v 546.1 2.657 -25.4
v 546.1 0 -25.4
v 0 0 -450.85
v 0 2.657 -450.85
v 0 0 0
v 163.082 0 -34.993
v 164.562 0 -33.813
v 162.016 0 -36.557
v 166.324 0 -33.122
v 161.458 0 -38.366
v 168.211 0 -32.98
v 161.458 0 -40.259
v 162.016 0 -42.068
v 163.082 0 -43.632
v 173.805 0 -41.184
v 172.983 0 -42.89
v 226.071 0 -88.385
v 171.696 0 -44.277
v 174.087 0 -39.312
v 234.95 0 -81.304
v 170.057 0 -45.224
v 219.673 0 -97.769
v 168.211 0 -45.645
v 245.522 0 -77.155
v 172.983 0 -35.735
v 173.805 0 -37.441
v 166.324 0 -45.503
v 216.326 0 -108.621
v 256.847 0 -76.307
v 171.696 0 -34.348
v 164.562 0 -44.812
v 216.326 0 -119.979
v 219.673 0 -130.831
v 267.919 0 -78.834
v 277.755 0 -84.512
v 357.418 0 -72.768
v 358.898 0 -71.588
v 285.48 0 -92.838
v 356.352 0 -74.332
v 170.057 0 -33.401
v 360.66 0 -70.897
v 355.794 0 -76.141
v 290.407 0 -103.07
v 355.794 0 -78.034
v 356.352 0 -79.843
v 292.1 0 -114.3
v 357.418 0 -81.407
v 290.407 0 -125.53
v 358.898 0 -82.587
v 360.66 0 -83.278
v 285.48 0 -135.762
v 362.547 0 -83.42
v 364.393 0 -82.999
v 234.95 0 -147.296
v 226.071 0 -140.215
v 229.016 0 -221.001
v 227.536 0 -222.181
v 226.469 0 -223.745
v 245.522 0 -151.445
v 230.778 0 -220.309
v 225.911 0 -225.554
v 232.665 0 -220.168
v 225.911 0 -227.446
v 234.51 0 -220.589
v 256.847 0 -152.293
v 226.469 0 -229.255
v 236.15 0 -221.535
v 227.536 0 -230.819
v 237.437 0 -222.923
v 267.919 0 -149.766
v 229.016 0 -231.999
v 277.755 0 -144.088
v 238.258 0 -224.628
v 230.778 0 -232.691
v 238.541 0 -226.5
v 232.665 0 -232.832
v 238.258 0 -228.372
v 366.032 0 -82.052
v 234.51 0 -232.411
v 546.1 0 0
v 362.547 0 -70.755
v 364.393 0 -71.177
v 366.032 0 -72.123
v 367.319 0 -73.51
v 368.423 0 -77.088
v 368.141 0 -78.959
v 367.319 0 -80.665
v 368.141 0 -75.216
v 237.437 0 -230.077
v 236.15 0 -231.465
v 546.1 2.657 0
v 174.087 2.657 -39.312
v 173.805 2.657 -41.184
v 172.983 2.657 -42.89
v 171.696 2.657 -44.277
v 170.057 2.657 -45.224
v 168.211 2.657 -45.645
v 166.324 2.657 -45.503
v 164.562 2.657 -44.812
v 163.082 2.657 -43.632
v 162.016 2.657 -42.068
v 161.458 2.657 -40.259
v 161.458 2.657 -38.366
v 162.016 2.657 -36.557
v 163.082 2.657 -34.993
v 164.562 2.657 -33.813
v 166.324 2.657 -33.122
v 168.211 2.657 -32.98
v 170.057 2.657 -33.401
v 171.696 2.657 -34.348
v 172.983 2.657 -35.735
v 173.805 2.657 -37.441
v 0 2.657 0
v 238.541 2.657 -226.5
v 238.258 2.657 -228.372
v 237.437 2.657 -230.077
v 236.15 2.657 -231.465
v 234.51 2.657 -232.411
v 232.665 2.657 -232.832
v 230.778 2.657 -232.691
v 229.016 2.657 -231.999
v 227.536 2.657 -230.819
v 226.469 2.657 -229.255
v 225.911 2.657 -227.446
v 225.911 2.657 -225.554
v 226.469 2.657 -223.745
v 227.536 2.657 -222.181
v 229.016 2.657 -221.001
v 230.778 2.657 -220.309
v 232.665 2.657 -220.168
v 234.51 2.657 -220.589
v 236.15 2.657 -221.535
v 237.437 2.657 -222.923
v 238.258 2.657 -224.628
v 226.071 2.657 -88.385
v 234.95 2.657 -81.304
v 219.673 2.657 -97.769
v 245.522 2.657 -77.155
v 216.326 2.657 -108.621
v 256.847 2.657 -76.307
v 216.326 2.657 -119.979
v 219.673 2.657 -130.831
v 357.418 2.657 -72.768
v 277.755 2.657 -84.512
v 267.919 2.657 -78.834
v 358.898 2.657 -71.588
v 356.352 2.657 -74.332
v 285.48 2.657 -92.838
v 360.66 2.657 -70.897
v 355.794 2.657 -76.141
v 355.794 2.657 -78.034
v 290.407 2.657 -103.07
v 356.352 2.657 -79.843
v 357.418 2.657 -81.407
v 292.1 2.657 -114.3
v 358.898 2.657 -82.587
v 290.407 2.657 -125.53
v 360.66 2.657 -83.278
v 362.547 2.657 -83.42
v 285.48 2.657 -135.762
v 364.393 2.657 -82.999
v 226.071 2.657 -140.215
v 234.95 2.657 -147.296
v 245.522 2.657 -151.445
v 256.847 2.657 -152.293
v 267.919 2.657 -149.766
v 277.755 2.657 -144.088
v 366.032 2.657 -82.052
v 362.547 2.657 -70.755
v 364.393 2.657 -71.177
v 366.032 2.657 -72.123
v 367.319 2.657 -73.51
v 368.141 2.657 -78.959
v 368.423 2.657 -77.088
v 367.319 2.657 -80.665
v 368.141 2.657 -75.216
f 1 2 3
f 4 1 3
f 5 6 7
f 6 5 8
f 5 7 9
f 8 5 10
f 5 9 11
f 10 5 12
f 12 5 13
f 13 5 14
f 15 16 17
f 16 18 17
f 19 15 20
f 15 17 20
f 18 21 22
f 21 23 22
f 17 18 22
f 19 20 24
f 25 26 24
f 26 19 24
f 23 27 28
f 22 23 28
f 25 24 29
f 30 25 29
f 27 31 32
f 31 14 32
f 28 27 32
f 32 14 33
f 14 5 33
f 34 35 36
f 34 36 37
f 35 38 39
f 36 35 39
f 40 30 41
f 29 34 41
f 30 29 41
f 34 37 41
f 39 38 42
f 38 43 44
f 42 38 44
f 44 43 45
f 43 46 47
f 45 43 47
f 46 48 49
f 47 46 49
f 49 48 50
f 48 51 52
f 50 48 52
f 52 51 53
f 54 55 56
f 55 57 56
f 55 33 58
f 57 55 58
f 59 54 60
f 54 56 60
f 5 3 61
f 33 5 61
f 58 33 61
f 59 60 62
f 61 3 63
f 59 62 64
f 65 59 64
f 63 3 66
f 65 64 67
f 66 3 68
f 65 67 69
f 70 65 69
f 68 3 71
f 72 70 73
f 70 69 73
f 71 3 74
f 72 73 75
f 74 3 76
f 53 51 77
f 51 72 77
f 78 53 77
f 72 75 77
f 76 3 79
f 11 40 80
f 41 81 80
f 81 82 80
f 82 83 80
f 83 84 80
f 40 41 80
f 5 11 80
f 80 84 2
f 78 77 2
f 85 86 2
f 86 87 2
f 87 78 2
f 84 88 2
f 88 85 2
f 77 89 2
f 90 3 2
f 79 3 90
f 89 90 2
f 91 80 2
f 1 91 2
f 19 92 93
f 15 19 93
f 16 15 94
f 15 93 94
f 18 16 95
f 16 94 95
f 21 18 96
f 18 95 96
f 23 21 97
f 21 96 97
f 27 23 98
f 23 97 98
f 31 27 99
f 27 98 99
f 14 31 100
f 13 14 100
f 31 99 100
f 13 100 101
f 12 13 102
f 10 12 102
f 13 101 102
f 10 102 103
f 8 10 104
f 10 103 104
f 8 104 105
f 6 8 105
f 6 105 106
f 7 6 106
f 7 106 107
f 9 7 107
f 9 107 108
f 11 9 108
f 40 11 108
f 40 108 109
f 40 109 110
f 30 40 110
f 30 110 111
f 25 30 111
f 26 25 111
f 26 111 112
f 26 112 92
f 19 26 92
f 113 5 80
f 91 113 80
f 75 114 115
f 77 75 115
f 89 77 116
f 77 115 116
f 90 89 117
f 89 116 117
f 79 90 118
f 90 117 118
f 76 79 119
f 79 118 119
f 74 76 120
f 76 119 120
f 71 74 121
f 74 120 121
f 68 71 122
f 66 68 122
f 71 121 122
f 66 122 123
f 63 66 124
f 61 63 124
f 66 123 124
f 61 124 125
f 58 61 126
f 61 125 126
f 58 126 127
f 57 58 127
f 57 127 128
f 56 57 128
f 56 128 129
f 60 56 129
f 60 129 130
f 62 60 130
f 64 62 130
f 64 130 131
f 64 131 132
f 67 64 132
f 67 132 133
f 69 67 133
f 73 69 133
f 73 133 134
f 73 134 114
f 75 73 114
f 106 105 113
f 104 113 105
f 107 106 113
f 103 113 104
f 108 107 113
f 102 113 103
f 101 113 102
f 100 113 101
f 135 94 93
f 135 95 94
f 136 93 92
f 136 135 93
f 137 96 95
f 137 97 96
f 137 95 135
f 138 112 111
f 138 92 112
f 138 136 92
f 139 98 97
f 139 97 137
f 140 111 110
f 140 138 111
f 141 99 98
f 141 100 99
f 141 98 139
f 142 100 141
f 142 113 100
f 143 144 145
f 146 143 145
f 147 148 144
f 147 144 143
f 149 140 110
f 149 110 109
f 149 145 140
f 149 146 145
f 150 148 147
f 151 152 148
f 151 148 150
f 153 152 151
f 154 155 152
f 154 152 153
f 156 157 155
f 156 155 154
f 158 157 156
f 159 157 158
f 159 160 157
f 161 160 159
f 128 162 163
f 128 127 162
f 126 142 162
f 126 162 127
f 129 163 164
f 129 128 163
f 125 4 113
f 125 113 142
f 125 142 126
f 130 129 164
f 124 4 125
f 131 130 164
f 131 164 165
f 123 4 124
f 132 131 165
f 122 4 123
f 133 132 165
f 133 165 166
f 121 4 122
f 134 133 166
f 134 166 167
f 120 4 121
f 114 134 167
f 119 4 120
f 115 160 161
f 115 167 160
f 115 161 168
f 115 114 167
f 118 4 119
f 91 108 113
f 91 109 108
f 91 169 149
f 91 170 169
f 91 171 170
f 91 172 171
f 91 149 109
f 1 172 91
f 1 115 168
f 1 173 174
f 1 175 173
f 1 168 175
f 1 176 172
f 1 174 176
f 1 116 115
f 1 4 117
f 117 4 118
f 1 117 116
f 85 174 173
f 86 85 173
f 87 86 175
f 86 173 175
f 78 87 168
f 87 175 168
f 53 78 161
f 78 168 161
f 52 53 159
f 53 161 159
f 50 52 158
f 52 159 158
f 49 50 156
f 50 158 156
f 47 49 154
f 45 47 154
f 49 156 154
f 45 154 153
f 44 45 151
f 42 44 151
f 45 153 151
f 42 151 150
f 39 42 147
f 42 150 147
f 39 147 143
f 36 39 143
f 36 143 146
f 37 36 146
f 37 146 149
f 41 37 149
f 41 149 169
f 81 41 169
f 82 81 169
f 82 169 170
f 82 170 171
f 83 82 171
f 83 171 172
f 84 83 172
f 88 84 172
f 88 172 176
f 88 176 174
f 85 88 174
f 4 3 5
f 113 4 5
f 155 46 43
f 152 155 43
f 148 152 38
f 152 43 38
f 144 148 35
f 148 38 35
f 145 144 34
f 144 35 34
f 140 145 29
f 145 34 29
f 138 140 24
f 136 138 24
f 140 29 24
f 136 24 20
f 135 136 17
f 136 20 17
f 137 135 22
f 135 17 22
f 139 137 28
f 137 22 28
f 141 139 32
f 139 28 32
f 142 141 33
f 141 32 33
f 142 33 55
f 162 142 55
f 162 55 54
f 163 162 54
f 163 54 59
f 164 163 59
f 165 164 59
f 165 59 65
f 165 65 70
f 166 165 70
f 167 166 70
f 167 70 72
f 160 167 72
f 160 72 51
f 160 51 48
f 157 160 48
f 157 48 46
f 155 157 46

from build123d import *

# Parameters (mm, degrees)
BOSS_EXTRUDE1_DEPTH = 2.65684
SKETCH2_R           = 38.1
CUT_EXTRUDE1_DEPTH  = 3.65684
SKETCH3_R           = 6.35
CUT_EXTRUDE2_DEPTH  = 3.65684


with BuildPart() as part:
    # Sketch1 → Boss-Extrude1 (new body)
    with BuildSketch(Plane(origin=(0, 0, 0), x_dir=(1, 0, 0), z_dir=(0, 1, 0))):
        Polygon((0, 450.85), (0, 0), (546.1, 0), (546.1, 25.4), align=None)
    extrude(amount=BOSS_EXTRUDE1_DEPTH)

    # Sketch2 → Cut-Extrude1 (cut, through all)
    with BuildSketch(Plane.XZ):
        with Locations((254, -114.3)):
            Circle(SKETCH2_R)
    extrude(amount=-CUT_EXTRUDE1_DEPTH, mode=Mode.SUBTRACT)

    # Sketch3 → Cut-Extrude2 (cut, through all)
    with BuildSketch(Plane(origin=(0, 2.65684, 0), x_dir=(1, 0, 0), z_dir=(0, 1, 0))):
        with Locations((362.072773191, 77.087559946)):
            Circle(SKETCH3_R)
        with Locations((167.736694981, 39.312452986)):
            Circle(SKETCH3_R)
        with Locations((232.190531828, 226.499987068)):
            Circle(SKETCH3_R)
    extrude(amount=-CUT_EXTRUDE2_DEPTH, mode=Mode.SUBTRACT)


solid = part.part
